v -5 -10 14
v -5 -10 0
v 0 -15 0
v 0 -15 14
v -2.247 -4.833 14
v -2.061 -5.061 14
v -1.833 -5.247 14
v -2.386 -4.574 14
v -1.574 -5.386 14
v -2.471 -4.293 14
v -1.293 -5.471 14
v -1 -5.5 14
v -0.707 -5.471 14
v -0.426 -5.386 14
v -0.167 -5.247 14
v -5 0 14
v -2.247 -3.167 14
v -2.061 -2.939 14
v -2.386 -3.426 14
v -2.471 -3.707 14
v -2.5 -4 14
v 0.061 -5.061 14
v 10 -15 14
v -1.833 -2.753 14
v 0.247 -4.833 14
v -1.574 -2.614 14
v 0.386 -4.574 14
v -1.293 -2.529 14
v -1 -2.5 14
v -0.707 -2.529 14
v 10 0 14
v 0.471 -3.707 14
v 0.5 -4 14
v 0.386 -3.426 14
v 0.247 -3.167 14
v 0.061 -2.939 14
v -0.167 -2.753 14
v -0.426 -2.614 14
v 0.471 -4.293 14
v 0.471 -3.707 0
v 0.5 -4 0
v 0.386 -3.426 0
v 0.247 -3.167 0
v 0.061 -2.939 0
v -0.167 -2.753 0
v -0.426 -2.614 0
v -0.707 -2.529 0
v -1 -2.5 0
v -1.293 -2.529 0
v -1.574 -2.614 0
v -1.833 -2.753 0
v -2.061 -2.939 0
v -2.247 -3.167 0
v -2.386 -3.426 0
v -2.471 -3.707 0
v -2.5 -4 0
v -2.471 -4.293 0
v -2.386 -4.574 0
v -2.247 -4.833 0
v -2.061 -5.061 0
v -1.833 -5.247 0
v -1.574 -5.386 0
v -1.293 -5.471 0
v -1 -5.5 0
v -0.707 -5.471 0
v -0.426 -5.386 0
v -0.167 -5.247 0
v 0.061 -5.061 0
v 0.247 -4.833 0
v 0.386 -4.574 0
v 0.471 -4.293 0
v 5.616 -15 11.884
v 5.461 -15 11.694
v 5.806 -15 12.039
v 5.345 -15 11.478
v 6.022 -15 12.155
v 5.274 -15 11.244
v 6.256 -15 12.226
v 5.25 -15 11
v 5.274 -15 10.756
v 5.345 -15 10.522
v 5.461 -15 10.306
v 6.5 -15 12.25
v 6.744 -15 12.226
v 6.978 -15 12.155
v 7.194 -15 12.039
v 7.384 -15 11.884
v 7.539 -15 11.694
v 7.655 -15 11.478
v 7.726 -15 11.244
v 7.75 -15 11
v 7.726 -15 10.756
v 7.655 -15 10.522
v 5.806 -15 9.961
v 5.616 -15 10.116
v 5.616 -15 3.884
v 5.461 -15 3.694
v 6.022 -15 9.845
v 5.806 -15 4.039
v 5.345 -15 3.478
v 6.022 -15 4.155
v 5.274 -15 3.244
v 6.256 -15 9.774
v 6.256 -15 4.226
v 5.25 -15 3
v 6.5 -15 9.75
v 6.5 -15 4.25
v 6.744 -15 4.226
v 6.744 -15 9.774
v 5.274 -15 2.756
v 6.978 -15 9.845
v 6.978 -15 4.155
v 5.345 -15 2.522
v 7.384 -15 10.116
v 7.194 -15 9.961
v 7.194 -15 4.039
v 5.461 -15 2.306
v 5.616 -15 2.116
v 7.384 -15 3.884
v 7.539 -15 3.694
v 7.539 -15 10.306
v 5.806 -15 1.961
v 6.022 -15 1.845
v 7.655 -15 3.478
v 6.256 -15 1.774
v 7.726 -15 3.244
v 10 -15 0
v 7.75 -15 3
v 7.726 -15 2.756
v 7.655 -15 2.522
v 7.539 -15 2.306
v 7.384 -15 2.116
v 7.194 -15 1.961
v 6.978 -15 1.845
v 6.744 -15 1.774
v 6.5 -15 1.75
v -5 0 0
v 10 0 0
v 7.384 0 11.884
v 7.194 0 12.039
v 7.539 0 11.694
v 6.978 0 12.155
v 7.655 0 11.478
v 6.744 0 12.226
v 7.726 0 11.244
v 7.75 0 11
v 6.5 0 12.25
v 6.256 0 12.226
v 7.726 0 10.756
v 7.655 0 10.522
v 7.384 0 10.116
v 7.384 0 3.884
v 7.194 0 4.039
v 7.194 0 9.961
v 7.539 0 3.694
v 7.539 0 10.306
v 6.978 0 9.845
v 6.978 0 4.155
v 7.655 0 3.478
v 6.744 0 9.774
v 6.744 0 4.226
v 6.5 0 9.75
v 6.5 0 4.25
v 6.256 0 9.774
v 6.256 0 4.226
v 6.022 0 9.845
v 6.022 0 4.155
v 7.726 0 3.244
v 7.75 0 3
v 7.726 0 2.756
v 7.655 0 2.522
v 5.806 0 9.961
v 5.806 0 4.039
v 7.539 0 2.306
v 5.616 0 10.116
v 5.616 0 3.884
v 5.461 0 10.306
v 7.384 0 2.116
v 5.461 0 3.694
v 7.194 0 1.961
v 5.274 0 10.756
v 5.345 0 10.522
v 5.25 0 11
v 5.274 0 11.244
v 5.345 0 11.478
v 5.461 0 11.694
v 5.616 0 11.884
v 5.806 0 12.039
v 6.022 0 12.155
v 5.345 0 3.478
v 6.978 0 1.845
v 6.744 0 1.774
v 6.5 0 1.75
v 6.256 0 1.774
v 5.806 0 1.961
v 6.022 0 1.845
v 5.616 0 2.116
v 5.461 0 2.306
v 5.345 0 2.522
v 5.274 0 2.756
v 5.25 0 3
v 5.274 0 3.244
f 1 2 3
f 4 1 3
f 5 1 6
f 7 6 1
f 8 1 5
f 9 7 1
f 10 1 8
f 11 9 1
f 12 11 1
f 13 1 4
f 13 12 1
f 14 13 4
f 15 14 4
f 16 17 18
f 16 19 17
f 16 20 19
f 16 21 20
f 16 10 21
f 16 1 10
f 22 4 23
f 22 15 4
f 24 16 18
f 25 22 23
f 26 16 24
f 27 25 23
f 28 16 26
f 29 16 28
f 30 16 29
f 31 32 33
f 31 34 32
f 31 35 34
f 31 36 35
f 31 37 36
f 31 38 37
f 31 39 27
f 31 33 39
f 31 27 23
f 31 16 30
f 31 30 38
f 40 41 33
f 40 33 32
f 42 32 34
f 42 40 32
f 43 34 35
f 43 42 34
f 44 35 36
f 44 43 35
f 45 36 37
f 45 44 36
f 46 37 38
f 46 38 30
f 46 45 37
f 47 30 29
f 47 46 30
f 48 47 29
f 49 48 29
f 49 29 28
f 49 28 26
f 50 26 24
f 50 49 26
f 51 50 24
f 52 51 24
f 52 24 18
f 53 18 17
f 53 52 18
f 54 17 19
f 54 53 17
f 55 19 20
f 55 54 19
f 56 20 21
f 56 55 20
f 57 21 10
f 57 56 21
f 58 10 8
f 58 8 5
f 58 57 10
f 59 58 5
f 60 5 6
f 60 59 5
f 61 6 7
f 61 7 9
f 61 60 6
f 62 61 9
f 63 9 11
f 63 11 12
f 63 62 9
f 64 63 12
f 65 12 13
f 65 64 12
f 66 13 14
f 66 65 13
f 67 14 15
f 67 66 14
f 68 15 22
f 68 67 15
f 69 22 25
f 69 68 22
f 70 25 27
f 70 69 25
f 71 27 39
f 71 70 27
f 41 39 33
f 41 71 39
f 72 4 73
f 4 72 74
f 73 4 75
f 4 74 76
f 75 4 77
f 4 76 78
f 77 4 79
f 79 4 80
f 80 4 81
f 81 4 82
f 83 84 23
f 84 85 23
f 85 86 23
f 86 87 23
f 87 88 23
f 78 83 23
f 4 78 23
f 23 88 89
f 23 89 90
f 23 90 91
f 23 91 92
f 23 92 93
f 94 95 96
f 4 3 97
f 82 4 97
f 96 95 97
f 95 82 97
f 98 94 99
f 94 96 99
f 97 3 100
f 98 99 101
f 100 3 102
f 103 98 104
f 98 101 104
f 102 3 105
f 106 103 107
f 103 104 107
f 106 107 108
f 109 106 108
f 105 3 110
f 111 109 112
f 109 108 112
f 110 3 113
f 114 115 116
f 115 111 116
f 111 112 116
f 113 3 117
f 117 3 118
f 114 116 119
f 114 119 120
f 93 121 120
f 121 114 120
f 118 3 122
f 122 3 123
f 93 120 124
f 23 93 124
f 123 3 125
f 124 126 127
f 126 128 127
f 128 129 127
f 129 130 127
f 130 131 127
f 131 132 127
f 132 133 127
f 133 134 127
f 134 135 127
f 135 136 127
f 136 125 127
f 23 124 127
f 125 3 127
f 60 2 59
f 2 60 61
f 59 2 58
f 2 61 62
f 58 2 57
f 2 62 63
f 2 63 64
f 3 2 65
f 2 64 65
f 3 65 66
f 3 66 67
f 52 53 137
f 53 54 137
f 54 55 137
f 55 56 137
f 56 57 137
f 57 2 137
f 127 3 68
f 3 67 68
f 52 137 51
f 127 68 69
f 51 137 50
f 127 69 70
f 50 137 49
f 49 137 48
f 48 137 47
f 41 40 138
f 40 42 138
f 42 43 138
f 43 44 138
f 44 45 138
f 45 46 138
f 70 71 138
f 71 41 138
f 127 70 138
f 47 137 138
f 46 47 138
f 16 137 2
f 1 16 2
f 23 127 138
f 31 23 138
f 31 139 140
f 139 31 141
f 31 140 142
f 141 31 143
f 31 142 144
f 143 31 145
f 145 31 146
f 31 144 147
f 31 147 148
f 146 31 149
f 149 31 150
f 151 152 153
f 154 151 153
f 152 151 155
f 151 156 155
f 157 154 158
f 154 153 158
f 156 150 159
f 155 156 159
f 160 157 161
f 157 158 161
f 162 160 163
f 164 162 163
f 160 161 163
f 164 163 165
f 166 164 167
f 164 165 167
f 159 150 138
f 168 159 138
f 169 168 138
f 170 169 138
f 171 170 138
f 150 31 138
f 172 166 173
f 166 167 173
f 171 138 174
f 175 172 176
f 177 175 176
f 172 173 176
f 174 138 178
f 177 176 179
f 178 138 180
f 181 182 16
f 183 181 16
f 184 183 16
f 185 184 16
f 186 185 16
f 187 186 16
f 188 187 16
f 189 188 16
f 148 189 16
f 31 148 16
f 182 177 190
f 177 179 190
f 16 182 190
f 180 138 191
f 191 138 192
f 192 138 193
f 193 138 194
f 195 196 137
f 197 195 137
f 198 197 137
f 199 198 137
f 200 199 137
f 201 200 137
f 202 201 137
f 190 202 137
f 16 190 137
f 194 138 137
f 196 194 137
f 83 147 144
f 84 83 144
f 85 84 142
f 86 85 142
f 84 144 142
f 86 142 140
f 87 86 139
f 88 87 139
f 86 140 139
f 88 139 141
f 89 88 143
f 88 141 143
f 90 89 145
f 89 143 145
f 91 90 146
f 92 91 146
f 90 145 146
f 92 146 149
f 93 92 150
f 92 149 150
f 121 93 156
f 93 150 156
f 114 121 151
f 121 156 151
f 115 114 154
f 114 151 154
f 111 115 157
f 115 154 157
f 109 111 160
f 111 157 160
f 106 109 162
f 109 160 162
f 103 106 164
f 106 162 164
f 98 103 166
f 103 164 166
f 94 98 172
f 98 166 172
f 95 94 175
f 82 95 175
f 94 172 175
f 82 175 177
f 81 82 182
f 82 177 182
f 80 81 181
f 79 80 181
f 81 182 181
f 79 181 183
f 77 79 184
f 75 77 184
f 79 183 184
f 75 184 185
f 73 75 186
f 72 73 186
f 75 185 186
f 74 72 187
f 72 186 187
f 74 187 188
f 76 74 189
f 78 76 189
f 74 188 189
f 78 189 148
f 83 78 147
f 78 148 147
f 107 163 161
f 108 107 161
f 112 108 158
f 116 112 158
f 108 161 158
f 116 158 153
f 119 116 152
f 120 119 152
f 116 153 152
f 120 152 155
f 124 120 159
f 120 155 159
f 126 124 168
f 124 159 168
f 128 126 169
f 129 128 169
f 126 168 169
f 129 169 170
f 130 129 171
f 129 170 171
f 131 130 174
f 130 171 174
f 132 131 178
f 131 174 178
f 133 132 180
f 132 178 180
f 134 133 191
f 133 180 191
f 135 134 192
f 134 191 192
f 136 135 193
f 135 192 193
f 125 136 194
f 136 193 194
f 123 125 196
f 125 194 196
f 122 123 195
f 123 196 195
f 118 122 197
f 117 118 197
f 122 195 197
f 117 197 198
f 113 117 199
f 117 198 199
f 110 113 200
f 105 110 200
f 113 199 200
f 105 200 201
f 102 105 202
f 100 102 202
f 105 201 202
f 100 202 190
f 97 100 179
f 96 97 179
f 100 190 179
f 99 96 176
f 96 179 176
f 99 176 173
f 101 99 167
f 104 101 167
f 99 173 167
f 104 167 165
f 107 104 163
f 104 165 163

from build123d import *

# Parameters (mm, degrees)
SKETCH_1_R          = 1.5
EXTRUDE_1_DEPTH     = 14
SKETCH_2_R          = 1.25
CUT_EXTRUDE_1_DEPTH = 15


with BuildPart() as part:
    # 草图1 → 凸台-拉伸1 (new body)
    with BuildSketch(Plane.XY):
        Polygon((-5, -10), (0, -15), (10, -15), (10, 0), (-5, 0), align=None)
        with Locations((-1, -4)):
            Circle(SKETCH_1_R, mode=Mode.SUBTRACT)
    extrude(amount=EXTRUDE_1_DEPTH)

    # 草图2 → 切除-拉伸1 (cut)
    with BuildSketch(Plane(origin=(0, 0, 0), x_dir=(1, 0, 0), z_dir=(0, 1, 0))):
        with Locations(Location((6.5, -3, 0), (0, 0, 270))):
            Circle(SKETCH_2_R)
        with Locations(Location((6.5, -11, 0), (0, 0, 270))):
            Circle(SKETCH_2_R)
    extrude(amount=-CUT_EXTRUDE_1_DEPTH, mode=Mode.SUBTRACT)


solid = part.part
